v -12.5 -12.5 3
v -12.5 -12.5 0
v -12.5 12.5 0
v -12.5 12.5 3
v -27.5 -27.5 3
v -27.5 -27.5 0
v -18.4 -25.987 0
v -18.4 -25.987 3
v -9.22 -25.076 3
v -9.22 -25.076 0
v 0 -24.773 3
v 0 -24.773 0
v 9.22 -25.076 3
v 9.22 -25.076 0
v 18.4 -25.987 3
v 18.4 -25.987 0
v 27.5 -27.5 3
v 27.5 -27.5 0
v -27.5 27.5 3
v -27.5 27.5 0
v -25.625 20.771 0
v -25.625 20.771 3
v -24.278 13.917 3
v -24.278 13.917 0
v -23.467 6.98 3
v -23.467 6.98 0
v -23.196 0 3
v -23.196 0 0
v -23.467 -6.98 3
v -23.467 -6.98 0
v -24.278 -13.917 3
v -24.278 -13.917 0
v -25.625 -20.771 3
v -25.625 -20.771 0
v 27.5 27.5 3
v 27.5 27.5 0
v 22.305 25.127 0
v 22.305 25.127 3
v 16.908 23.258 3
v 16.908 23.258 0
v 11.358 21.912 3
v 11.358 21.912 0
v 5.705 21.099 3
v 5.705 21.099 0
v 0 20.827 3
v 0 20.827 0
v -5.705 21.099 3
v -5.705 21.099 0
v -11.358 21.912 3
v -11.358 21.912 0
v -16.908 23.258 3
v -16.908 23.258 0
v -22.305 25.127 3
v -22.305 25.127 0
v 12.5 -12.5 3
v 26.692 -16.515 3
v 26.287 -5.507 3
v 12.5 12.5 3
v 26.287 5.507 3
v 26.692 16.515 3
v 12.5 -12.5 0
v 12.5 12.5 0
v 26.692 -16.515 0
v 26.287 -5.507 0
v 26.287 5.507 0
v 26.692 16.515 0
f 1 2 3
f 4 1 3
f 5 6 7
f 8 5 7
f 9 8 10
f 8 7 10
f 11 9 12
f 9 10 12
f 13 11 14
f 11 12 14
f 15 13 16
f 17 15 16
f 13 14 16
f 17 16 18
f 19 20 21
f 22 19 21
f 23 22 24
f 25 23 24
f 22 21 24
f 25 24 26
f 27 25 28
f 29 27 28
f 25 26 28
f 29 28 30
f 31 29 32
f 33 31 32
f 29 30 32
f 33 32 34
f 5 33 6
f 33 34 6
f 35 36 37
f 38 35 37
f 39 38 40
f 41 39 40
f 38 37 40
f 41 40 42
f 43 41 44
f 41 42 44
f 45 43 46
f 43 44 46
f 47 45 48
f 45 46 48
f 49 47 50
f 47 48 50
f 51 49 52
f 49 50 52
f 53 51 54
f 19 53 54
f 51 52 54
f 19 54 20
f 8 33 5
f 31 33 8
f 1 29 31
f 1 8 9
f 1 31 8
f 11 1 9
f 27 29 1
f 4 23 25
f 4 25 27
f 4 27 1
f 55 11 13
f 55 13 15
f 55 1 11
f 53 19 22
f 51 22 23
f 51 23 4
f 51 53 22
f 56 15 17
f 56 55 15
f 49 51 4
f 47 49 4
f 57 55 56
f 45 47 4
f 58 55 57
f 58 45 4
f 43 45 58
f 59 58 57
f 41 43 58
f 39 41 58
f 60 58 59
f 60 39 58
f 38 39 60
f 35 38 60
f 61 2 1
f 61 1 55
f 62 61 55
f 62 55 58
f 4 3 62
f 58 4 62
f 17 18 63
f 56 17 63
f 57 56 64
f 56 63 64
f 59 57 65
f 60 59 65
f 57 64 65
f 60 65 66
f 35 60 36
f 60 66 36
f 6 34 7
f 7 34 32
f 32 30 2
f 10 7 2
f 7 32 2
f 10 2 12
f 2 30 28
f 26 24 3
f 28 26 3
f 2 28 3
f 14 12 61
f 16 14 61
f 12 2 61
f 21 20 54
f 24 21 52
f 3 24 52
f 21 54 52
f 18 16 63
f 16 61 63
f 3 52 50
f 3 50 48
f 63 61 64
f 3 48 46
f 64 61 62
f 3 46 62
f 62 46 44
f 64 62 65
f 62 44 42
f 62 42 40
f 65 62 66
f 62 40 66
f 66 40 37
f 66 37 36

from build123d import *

# Parameters (mm, degrees)
F0_W     = 25
F0_H     = 25
F1_DEPTH = 3


with BuildPart() as f1:
    # F0 (on Top) → F1 (new body)
    with BuildSketch(Plane.XY):
        with BuildLine():
            ThreePointArc((27.5, 27.5), (0, 20.826823), (-27.5, 27.5))
            ThreePointArc((-27.5, 27.5), (-23.195683, 0), (-27.5, -27.5))
            ThreePointArc((-27.5, -27.5), (0, -24.772539), (27.5, -27.5))
            ThreePointArc((27.5, -27.5), (26.236924, 0), (27.5, 27.5))
        make_face()
        Rectangle(F0_W, F0_H, mode=Mode.SUBTRACT)
    extrude(amount=F1_DEPTH)


solid = f1.part
